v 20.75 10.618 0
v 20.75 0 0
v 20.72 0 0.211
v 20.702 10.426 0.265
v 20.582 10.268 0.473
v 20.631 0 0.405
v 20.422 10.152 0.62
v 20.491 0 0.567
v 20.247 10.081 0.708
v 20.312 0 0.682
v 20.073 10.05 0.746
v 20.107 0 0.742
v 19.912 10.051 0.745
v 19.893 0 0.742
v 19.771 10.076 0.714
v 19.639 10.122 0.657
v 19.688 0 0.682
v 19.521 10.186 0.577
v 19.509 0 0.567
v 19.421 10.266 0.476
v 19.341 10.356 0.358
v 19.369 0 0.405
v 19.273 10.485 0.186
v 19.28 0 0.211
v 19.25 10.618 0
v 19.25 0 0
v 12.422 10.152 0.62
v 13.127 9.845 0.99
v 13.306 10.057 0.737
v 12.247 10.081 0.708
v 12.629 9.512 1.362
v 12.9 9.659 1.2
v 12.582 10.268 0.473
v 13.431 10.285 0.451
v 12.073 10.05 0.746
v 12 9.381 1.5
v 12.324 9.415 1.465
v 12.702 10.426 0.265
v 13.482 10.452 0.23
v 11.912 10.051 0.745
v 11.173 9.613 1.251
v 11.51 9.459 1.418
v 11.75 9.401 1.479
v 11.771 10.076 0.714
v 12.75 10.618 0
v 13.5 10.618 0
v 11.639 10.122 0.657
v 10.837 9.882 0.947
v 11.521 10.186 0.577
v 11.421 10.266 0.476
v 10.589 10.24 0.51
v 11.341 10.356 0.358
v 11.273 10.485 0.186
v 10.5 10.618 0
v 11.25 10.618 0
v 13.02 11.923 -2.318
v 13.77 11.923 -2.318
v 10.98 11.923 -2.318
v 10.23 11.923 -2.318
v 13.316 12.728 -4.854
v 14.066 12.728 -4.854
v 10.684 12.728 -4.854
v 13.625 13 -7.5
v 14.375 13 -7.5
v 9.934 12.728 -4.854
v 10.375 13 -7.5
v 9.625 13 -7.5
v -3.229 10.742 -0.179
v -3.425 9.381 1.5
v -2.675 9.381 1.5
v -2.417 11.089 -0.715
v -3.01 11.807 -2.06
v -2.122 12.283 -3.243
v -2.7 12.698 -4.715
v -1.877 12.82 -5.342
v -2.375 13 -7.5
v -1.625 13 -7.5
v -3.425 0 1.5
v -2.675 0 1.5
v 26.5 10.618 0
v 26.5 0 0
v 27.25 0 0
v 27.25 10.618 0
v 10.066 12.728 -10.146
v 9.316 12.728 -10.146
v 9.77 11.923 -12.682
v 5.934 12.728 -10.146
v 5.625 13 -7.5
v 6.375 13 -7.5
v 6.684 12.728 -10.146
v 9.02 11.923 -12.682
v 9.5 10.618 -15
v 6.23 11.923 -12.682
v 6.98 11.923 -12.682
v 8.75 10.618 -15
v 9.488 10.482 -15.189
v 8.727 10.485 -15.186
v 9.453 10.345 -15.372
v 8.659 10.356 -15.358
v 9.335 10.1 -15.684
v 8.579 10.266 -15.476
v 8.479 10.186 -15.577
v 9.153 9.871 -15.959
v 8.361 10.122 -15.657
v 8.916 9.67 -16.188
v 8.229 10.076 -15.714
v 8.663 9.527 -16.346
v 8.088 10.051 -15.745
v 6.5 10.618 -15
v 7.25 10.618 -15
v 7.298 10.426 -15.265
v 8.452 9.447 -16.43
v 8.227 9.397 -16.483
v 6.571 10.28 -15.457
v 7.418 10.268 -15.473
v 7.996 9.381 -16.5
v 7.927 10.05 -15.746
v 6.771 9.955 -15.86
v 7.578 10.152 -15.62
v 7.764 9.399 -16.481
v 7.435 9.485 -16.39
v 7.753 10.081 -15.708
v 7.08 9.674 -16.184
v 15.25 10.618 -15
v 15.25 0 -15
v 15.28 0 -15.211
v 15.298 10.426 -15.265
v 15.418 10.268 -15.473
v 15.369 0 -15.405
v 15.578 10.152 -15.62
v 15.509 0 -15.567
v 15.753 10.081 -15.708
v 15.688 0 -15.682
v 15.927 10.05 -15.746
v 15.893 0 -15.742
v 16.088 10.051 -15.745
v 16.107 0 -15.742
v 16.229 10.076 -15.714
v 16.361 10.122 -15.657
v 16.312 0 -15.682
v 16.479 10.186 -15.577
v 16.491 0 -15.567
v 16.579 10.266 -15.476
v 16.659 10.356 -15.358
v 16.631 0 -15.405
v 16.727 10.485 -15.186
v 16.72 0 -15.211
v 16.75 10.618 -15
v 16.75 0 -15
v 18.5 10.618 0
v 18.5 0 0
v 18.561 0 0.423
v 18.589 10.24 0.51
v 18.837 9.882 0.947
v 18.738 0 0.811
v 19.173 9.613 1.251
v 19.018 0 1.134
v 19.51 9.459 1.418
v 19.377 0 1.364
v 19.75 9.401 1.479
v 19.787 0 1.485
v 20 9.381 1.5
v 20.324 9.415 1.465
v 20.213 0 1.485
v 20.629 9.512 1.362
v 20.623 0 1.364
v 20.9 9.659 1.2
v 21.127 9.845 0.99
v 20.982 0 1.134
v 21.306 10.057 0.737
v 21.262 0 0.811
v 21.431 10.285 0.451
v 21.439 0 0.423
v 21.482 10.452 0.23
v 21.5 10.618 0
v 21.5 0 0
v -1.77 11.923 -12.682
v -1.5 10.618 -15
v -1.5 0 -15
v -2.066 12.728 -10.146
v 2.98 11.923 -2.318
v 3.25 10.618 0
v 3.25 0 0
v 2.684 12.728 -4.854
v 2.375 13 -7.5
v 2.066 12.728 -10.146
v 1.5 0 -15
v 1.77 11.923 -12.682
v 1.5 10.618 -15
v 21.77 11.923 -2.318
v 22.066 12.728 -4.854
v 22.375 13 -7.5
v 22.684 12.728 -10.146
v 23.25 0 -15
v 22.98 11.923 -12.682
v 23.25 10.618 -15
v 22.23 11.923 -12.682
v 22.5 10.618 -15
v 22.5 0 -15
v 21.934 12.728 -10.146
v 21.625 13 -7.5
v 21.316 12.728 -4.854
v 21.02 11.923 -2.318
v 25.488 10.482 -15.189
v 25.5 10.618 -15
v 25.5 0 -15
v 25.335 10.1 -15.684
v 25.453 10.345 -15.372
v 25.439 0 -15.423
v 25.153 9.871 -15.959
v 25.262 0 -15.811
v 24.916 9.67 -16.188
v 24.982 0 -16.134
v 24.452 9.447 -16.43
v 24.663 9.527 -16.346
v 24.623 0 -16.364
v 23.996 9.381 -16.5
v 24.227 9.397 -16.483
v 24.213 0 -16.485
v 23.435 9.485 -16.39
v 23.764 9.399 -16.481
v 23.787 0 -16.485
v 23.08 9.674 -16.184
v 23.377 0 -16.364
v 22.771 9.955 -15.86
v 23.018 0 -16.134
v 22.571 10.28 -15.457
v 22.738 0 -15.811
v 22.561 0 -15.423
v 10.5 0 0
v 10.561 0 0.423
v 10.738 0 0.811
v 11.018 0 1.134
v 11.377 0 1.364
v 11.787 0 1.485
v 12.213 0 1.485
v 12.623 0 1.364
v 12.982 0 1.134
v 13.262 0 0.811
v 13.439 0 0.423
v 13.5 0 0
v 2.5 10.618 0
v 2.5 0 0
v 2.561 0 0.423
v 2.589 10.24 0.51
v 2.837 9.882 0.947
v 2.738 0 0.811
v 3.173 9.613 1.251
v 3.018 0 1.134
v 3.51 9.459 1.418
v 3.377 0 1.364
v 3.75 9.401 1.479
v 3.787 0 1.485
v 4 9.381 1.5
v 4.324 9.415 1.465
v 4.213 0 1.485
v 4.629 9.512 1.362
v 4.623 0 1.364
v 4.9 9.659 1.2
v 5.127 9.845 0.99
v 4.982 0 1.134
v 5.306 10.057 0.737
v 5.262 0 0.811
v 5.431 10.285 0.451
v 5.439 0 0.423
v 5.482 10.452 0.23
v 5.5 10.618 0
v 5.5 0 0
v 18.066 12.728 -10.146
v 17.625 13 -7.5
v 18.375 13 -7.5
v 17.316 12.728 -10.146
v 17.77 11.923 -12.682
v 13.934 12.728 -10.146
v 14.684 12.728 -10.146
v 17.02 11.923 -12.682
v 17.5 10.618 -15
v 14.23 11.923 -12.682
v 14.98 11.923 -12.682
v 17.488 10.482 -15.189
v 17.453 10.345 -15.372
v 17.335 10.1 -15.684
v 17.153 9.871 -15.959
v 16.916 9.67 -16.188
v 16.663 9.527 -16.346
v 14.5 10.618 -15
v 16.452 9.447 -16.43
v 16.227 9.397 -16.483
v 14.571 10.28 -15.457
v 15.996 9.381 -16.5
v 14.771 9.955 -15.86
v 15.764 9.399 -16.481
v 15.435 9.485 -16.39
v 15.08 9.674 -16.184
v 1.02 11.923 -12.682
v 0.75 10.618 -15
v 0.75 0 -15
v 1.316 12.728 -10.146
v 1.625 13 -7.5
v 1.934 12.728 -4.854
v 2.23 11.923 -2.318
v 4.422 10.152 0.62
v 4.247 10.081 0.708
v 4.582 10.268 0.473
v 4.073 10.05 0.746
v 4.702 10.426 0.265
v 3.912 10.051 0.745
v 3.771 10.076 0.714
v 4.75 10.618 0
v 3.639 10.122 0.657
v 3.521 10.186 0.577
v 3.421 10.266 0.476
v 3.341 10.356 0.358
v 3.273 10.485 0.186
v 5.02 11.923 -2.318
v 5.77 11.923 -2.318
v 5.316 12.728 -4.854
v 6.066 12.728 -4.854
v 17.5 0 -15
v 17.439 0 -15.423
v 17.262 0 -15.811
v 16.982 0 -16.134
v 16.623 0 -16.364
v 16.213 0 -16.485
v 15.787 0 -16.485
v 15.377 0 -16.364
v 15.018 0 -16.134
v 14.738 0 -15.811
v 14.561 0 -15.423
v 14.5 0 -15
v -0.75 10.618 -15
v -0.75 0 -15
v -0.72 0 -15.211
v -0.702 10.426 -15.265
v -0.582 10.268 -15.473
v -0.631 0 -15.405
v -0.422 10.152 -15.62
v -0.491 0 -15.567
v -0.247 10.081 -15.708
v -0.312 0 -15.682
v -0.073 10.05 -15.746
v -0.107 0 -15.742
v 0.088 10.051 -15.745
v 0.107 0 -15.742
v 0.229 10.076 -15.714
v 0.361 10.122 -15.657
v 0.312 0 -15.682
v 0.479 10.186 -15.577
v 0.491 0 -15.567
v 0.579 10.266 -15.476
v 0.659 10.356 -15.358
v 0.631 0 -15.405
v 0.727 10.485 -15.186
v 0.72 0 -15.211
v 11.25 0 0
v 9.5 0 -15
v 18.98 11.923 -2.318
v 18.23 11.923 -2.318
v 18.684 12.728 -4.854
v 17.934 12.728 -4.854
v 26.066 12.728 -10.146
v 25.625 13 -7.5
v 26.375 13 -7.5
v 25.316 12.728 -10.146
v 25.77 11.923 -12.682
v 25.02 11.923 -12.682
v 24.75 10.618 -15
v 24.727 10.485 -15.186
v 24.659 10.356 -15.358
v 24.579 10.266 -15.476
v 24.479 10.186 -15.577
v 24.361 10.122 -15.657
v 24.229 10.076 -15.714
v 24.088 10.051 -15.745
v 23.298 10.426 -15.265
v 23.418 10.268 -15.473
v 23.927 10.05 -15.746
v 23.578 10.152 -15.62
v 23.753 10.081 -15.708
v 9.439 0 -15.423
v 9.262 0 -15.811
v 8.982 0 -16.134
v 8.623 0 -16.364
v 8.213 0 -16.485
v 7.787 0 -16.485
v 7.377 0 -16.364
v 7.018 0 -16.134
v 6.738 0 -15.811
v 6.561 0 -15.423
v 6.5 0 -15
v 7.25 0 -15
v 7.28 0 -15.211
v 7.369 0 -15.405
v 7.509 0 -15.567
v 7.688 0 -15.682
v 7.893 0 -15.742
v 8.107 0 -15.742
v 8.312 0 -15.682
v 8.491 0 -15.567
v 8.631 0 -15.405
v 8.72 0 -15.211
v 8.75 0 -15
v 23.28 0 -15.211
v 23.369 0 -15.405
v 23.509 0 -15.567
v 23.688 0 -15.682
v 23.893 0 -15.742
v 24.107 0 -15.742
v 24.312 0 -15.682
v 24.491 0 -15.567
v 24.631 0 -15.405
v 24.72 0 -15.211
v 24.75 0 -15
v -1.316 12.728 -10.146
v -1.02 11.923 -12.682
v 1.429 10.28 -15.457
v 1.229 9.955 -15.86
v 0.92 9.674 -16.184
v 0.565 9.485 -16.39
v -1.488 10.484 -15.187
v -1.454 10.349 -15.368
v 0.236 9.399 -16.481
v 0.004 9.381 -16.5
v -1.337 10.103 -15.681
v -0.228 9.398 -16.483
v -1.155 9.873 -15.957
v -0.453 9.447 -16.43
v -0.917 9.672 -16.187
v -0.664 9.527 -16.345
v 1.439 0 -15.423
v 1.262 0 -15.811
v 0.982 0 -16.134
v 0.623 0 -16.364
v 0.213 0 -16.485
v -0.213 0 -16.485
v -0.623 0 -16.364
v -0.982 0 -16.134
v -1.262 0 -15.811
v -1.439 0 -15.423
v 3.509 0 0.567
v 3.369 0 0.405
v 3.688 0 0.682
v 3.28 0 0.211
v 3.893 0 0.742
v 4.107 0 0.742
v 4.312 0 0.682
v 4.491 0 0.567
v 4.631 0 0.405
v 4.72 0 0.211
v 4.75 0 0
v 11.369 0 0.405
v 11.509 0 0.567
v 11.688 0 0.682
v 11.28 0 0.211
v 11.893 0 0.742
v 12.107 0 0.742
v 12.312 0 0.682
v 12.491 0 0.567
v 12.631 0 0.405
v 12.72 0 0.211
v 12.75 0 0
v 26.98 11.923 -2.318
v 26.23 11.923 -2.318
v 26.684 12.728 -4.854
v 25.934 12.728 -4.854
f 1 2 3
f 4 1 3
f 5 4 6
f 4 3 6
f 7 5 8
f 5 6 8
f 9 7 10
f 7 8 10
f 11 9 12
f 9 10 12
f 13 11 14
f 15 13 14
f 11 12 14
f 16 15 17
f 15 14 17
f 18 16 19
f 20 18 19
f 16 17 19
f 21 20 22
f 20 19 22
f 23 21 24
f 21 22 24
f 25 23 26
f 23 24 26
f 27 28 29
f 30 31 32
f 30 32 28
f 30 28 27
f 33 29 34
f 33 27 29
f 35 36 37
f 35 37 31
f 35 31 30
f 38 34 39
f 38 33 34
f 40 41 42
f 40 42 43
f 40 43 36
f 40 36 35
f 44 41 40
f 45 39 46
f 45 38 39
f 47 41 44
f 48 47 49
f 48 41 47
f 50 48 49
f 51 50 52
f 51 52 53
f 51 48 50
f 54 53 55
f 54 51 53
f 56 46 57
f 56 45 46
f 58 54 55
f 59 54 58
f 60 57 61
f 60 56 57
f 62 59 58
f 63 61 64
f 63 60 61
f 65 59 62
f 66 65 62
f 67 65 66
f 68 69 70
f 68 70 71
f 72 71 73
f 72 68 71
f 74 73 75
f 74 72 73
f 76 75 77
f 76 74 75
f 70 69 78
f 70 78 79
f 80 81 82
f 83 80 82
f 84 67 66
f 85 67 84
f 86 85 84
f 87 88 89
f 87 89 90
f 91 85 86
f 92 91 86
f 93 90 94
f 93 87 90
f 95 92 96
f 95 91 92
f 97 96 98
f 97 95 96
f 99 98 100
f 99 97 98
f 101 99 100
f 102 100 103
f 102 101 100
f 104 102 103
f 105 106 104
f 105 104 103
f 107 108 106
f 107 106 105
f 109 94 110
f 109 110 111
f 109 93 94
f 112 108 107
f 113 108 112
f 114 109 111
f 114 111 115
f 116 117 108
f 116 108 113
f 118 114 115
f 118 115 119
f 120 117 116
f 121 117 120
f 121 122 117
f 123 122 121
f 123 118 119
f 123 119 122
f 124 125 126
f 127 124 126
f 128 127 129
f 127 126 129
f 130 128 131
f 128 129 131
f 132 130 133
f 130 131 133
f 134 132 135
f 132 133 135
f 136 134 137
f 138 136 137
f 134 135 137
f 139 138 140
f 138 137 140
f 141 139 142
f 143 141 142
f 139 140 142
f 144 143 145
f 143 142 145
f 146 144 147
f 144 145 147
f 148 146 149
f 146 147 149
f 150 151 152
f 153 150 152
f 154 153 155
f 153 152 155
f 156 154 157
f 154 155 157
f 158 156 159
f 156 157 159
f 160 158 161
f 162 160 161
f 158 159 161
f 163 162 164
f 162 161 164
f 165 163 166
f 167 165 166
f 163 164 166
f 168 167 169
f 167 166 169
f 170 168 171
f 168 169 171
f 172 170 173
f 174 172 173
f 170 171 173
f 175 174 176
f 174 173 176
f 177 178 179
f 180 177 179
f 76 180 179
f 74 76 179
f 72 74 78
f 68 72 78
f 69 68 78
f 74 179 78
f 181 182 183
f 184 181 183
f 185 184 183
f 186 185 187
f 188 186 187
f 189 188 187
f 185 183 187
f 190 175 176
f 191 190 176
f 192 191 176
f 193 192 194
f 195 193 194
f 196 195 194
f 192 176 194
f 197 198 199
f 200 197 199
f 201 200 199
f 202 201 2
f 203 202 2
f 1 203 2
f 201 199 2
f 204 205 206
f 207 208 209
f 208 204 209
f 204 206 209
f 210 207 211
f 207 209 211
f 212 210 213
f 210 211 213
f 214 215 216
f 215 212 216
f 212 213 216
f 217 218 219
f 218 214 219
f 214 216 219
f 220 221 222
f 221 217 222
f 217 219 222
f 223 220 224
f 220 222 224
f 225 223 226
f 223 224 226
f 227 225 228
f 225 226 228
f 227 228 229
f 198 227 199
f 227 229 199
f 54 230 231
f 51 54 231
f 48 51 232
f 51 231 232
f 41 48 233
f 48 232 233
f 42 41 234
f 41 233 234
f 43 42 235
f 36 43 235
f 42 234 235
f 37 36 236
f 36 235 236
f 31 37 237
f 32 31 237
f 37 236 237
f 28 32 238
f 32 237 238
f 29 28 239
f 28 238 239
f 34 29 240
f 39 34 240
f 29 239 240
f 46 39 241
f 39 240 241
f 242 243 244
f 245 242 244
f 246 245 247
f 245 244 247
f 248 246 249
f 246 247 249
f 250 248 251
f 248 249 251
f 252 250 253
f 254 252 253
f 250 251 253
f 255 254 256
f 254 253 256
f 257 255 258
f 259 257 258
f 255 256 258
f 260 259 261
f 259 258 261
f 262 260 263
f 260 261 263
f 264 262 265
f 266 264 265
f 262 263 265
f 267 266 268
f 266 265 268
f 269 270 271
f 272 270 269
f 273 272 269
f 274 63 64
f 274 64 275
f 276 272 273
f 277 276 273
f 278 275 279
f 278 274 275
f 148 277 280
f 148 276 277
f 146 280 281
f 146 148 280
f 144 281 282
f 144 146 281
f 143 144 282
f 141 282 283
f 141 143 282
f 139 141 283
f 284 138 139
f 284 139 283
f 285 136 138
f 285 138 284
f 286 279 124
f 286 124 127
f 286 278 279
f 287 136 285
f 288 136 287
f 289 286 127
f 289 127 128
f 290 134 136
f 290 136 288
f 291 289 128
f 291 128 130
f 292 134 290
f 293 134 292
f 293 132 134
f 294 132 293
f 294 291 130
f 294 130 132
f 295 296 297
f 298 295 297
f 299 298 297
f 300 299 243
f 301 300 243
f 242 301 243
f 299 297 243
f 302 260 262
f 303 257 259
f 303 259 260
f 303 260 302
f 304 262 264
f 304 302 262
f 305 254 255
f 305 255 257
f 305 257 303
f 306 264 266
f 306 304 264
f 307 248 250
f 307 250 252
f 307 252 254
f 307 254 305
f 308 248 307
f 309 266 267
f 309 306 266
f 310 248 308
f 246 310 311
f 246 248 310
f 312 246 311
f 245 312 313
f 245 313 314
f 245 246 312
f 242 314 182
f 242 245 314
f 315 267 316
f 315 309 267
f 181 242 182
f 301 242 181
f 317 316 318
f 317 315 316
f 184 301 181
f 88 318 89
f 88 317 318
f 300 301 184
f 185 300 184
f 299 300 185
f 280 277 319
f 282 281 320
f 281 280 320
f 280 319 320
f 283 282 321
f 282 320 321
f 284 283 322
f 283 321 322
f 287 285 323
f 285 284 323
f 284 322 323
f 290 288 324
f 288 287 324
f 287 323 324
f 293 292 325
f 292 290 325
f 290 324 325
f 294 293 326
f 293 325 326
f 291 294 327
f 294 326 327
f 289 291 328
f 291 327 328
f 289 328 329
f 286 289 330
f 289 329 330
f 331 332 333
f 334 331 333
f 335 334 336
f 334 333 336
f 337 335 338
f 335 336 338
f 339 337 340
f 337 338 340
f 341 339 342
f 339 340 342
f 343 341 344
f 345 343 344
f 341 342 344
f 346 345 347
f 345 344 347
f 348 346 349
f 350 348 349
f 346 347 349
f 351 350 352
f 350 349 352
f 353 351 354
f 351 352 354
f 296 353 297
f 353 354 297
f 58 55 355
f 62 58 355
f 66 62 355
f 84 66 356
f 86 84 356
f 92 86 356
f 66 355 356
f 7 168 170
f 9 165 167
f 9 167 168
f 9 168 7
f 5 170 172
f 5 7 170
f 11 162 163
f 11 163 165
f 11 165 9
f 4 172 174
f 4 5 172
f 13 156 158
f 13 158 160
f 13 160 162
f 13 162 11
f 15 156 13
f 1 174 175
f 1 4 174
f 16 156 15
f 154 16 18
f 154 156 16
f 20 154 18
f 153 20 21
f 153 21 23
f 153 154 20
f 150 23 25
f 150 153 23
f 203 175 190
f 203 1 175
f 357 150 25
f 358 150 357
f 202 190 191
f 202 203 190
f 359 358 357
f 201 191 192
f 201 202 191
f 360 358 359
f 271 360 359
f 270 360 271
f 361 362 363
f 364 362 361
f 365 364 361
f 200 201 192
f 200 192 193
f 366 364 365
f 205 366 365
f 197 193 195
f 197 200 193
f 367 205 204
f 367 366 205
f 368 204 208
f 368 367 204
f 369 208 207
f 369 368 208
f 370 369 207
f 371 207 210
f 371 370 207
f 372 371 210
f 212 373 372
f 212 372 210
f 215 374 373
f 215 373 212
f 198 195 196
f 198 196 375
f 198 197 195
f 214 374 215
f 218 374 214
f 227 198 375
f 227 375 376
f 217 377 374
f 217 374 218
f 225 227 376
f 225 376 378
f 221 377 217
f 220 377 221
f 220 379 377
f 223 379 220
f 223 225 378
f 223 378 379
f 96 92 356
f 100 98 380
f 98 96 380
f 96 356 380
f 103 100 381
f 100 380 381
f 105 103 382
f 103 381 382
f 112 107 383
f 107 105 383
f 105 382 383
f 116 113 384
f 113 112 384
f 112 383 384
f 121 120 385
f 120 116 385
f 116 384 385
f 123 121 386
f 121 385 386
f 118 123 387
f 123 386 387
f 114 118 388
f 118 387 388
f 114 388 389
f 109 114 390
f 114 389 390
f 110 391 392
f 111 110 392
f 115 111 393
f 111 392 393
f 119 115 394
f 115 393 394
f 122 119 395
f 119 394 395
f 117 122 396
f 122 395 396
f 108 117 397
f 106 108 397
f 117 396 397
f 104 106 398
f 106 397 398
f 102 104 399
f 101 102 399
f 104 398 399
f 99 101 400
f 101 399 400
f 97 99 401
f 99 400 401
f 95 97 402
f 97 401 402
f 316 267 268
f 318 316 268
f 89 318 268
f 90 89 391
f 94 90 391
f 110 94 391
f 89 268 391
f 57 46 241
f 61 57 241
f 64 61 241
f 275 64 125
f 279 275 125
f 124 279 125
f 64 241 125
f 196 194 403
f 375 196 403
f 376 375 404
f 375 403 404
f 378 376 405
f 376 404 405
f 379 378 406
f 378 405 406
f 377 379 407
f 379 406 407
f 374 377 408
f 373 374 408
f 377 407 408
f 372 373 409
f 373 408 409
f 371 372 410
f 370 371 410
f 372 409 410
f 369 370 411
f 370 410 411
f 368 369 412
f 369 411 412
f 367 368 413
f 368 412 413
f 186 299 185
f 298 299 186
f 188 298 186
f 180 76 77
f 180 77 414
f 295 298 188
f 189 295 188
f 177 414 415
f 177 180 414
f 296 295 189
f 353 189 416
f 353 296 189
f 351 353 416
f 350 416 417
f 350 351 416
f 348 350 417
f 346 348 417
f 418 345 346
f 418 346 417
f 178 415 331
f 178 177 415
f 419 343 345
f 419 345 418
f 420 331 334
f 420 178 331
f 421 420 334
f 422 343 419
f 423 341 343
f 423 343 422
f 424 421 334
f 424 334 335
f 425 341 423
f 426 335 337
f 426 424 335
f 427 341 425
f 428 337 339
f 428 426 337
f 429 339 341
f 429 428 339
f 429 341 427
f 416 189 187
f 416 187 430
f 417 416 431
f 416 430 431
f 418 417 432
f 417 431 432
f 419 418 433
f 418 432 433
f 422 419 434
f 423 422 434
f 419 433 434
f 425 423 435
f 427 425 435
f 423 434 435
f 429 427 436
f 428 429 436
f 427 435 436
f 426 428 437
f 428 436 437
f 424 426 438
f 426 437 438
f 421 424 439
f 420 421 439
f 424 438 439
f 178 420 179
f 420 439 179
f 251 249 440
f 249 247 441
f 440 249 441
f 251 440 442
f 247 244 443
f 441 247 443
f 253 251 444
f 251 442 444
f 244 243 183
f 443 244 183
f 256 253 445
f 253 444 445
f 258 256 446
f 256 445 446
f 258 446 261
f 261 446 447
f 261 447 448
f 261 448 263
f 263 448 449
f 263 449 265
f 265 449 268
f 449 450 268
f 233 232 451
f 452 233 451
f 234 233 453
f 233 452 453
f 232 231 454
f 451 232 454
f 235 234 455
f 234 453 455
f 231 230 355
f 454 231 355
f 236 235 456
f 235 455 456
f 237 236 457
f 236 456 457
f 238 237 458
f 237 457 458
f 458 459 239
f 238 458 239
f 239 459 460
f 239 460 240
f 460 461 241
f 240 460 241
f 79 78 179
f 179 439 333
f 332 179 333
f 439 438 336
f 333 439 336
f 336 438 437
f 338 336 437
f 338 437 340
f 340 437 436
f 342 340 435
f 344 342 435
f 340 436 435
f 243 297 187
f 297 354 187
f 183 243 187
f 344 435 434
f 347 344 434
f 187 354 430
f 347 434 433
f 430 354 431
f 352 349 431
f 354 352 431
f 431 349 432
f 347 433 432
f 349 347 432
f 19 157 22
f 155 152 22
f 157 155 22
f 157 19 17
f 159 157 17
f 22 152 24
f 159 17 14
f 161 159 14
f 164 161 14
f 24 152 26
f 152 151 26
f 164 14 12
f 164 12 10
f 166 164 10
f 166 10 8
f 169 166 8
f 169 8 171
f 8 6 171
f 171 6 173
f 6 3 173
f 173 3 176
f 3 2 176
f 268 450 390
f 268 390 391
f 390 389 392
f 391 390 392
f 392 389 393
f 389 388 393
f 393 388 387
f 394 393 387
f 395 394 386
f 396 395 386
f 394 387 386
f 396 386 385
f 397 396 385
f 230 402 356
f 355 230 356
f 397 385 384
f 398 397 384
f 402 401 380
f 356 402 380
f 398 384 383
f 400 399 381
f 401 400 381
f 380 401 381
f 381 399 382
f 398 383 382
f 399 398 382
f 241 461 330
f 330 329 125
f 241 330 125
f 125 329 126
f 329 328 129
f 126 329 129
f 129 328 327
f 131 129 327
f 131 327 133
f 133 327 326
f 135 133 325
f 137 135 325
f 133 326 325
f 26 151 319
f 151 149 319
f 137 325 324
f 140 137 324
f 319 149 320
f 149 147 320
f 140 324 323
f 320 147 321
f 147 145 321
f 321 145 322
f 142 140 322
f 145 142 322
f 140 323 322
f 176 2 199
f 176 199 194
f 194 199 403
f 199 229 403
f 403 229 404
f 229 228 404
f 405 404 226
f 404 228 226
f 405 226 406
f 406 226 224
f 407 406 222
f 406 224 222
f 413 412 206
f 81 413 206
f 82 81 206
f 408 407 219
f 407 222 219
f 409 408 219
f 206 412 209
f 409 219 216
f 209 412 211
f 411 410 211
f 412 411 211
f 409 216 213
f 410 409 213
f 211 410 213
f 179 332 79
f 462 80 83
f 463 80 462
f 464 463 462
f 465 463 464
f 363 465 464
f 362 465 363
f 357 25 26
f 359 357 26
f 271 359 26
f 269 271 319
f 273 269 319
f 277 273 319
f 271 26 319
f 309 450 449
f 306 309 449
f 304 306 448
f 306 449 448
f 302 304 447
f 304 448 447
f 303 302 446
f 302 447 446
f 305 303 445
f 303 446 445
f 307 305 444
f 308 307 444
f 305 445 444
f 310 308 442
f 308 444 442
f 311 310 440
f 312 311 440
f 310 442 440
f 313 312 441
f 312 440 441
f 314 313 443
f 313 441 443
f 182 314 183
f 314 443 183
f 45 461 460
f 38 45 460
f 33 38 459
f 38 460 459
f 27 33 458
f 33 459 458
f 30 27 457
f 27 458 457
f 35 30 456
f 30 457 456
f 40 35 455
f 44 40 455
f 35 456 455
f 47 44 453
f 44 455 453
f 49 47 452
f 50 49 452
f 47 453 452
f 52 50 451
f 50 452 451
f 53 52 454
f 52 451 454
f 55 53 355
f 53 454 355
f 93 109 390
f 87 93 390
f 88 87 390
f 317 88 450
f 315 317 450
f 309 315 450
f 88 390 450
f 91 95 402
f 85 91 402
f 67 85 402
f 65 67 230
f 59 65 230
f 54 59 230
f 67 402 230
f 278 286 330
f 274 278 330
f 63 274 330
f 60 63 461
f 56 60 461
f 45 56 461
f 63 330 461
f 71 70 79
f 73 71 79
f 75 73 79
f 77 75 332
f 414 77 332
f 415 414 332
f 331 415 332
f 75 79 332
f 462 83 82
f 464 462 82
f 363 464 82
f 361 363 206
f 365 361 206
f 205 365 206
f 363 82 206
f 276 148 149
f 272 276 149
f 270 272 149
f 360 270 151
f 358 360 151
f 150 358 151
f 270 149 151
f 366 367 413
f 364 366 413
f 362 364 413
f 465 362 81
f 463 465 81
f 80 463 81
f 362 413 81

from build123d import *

# Parameters (mm, degrees)
EXTRUDE_2_DEPTH          = 13
CUT_EXTRUDE_1_DEPTH      = 35.406576406
CUT_EXTRUDE_1_DEPTH_BACK = 35.406576406


with BuildPart() as part:
    # 草图1 → 凸台-拉伸2 (new body)
    with BuildSketch(Plane(origin=(0, 0, 0), x_dir=(1, 0, 0), z_dir=(0, 1, 0))):
        with BuildLine():
            Line((0.75, 15), (2.5, 0))
            ThreePointArc((2.5, 0), (4, -1.5), (5.5, 0))
            Line((5.5, 0), (7.25, 15))
            ThreePointArc((7.25, 15), (8, 15.75), (8.75, 15))
            Line((8.75, 15), (10.5, 0))
            ThreePointArc((10.5, 0), (12, -1.5), (13.5, 0))
            Line((13.5, 0), (15.25, 15))
            ThreePointArc((15.25, 15), (16, 15.75), (16.75, 15))
            Line((16.75, 15), (18.5, 0))
            ThreePointArc((18.5, 0), (20, -1.5), (21.5, 0))
            Line((21.5, 0), (23.25, 15))
            ThreePointArc((23.25, 15), (24, 15.75), (24.75, 15))
            Line((24.75, 15), (26.5, 0))
            Line((26.5, 0), (27.25, 0))
            Line((27.25, 0), (25.5, 15))
            ThreePointArc((25.5, 15), (24, 16.5), (22.5, 15))
            Line((22.5, 15), (20.75, 0))
            ThreePointArc((20.75, 0), (20, -0.75), (19.25, 0))
            Line((19.25, 0), (17.5, 15))
            ThreePointArc((17.5, 15), (16, 16.5), (14.5, 15))
            Line((14.5, 15), (12.75, 0))
            ThreePointArc((12.75, 0), (12, -0.75), (11.25, 0))
            Line((11.25, 0), (9.5, 15))
            ThreePointArc((9.5, 15), (8, 16.5), (6.5, 15))
            Line((6.5, 15), (4.75, 0))
            ThreePointArc((4.75, 0), (4, -0.75), (3.25, 0))
            Line((3.25, 0), (1.5, 15))
            ThreePointArc((1.5, 15), (0, 16.5), (-1.5, 15))
            Line((-1.5, 15), (-3.425, -1.5))
            Line((-3.425, -1.5), (-2.675, -1.5))
            Line((-2.675, -1.5), (-0.75, 15))
            ThreePointArc((-0.75, 15), (0, 15.75), (0.75, 15))
        make_face()
    extrude(amount=EXTRUDE_2_DEPTH)

    # 草图2 → 切除-拉伸1 (cut, two sides: drawn at the far end of the back side and taken through both)
    with BuildSketch(Plane(origin=(0, 0, 0), x_dir=(0, 0, -1), z_dir=(1, 0, 0)).offset(-CUT_EXTRUDE_1_DEPTH_BACK)):
        with BuildLine():
            Line((7.5, 13), (-1.5, 13))
            Line((-1.5, 13), (-1.5, 9.38083152))
            ThreePointArc((-1.5, 9.38083152), (2.649784013, 12.061318538), (7.5, 13))
        make_face()
        with BuildLine():
            Line((16.5, 13), (7.5, 13))
            ThreePointArc((7.5, 13), (12.350215987, 12.061318538), (16.5, 9.38083152))
            Line((16.5, 9.38083152), (16.5, 13))
        make_face()
    extrude(amount=CUT_EXTRUDE_1_DEPTH + CUT_EXTRUDE_1_DEPTH_BACK, mode=Mode.SUBTRACT)


solid = part.part
